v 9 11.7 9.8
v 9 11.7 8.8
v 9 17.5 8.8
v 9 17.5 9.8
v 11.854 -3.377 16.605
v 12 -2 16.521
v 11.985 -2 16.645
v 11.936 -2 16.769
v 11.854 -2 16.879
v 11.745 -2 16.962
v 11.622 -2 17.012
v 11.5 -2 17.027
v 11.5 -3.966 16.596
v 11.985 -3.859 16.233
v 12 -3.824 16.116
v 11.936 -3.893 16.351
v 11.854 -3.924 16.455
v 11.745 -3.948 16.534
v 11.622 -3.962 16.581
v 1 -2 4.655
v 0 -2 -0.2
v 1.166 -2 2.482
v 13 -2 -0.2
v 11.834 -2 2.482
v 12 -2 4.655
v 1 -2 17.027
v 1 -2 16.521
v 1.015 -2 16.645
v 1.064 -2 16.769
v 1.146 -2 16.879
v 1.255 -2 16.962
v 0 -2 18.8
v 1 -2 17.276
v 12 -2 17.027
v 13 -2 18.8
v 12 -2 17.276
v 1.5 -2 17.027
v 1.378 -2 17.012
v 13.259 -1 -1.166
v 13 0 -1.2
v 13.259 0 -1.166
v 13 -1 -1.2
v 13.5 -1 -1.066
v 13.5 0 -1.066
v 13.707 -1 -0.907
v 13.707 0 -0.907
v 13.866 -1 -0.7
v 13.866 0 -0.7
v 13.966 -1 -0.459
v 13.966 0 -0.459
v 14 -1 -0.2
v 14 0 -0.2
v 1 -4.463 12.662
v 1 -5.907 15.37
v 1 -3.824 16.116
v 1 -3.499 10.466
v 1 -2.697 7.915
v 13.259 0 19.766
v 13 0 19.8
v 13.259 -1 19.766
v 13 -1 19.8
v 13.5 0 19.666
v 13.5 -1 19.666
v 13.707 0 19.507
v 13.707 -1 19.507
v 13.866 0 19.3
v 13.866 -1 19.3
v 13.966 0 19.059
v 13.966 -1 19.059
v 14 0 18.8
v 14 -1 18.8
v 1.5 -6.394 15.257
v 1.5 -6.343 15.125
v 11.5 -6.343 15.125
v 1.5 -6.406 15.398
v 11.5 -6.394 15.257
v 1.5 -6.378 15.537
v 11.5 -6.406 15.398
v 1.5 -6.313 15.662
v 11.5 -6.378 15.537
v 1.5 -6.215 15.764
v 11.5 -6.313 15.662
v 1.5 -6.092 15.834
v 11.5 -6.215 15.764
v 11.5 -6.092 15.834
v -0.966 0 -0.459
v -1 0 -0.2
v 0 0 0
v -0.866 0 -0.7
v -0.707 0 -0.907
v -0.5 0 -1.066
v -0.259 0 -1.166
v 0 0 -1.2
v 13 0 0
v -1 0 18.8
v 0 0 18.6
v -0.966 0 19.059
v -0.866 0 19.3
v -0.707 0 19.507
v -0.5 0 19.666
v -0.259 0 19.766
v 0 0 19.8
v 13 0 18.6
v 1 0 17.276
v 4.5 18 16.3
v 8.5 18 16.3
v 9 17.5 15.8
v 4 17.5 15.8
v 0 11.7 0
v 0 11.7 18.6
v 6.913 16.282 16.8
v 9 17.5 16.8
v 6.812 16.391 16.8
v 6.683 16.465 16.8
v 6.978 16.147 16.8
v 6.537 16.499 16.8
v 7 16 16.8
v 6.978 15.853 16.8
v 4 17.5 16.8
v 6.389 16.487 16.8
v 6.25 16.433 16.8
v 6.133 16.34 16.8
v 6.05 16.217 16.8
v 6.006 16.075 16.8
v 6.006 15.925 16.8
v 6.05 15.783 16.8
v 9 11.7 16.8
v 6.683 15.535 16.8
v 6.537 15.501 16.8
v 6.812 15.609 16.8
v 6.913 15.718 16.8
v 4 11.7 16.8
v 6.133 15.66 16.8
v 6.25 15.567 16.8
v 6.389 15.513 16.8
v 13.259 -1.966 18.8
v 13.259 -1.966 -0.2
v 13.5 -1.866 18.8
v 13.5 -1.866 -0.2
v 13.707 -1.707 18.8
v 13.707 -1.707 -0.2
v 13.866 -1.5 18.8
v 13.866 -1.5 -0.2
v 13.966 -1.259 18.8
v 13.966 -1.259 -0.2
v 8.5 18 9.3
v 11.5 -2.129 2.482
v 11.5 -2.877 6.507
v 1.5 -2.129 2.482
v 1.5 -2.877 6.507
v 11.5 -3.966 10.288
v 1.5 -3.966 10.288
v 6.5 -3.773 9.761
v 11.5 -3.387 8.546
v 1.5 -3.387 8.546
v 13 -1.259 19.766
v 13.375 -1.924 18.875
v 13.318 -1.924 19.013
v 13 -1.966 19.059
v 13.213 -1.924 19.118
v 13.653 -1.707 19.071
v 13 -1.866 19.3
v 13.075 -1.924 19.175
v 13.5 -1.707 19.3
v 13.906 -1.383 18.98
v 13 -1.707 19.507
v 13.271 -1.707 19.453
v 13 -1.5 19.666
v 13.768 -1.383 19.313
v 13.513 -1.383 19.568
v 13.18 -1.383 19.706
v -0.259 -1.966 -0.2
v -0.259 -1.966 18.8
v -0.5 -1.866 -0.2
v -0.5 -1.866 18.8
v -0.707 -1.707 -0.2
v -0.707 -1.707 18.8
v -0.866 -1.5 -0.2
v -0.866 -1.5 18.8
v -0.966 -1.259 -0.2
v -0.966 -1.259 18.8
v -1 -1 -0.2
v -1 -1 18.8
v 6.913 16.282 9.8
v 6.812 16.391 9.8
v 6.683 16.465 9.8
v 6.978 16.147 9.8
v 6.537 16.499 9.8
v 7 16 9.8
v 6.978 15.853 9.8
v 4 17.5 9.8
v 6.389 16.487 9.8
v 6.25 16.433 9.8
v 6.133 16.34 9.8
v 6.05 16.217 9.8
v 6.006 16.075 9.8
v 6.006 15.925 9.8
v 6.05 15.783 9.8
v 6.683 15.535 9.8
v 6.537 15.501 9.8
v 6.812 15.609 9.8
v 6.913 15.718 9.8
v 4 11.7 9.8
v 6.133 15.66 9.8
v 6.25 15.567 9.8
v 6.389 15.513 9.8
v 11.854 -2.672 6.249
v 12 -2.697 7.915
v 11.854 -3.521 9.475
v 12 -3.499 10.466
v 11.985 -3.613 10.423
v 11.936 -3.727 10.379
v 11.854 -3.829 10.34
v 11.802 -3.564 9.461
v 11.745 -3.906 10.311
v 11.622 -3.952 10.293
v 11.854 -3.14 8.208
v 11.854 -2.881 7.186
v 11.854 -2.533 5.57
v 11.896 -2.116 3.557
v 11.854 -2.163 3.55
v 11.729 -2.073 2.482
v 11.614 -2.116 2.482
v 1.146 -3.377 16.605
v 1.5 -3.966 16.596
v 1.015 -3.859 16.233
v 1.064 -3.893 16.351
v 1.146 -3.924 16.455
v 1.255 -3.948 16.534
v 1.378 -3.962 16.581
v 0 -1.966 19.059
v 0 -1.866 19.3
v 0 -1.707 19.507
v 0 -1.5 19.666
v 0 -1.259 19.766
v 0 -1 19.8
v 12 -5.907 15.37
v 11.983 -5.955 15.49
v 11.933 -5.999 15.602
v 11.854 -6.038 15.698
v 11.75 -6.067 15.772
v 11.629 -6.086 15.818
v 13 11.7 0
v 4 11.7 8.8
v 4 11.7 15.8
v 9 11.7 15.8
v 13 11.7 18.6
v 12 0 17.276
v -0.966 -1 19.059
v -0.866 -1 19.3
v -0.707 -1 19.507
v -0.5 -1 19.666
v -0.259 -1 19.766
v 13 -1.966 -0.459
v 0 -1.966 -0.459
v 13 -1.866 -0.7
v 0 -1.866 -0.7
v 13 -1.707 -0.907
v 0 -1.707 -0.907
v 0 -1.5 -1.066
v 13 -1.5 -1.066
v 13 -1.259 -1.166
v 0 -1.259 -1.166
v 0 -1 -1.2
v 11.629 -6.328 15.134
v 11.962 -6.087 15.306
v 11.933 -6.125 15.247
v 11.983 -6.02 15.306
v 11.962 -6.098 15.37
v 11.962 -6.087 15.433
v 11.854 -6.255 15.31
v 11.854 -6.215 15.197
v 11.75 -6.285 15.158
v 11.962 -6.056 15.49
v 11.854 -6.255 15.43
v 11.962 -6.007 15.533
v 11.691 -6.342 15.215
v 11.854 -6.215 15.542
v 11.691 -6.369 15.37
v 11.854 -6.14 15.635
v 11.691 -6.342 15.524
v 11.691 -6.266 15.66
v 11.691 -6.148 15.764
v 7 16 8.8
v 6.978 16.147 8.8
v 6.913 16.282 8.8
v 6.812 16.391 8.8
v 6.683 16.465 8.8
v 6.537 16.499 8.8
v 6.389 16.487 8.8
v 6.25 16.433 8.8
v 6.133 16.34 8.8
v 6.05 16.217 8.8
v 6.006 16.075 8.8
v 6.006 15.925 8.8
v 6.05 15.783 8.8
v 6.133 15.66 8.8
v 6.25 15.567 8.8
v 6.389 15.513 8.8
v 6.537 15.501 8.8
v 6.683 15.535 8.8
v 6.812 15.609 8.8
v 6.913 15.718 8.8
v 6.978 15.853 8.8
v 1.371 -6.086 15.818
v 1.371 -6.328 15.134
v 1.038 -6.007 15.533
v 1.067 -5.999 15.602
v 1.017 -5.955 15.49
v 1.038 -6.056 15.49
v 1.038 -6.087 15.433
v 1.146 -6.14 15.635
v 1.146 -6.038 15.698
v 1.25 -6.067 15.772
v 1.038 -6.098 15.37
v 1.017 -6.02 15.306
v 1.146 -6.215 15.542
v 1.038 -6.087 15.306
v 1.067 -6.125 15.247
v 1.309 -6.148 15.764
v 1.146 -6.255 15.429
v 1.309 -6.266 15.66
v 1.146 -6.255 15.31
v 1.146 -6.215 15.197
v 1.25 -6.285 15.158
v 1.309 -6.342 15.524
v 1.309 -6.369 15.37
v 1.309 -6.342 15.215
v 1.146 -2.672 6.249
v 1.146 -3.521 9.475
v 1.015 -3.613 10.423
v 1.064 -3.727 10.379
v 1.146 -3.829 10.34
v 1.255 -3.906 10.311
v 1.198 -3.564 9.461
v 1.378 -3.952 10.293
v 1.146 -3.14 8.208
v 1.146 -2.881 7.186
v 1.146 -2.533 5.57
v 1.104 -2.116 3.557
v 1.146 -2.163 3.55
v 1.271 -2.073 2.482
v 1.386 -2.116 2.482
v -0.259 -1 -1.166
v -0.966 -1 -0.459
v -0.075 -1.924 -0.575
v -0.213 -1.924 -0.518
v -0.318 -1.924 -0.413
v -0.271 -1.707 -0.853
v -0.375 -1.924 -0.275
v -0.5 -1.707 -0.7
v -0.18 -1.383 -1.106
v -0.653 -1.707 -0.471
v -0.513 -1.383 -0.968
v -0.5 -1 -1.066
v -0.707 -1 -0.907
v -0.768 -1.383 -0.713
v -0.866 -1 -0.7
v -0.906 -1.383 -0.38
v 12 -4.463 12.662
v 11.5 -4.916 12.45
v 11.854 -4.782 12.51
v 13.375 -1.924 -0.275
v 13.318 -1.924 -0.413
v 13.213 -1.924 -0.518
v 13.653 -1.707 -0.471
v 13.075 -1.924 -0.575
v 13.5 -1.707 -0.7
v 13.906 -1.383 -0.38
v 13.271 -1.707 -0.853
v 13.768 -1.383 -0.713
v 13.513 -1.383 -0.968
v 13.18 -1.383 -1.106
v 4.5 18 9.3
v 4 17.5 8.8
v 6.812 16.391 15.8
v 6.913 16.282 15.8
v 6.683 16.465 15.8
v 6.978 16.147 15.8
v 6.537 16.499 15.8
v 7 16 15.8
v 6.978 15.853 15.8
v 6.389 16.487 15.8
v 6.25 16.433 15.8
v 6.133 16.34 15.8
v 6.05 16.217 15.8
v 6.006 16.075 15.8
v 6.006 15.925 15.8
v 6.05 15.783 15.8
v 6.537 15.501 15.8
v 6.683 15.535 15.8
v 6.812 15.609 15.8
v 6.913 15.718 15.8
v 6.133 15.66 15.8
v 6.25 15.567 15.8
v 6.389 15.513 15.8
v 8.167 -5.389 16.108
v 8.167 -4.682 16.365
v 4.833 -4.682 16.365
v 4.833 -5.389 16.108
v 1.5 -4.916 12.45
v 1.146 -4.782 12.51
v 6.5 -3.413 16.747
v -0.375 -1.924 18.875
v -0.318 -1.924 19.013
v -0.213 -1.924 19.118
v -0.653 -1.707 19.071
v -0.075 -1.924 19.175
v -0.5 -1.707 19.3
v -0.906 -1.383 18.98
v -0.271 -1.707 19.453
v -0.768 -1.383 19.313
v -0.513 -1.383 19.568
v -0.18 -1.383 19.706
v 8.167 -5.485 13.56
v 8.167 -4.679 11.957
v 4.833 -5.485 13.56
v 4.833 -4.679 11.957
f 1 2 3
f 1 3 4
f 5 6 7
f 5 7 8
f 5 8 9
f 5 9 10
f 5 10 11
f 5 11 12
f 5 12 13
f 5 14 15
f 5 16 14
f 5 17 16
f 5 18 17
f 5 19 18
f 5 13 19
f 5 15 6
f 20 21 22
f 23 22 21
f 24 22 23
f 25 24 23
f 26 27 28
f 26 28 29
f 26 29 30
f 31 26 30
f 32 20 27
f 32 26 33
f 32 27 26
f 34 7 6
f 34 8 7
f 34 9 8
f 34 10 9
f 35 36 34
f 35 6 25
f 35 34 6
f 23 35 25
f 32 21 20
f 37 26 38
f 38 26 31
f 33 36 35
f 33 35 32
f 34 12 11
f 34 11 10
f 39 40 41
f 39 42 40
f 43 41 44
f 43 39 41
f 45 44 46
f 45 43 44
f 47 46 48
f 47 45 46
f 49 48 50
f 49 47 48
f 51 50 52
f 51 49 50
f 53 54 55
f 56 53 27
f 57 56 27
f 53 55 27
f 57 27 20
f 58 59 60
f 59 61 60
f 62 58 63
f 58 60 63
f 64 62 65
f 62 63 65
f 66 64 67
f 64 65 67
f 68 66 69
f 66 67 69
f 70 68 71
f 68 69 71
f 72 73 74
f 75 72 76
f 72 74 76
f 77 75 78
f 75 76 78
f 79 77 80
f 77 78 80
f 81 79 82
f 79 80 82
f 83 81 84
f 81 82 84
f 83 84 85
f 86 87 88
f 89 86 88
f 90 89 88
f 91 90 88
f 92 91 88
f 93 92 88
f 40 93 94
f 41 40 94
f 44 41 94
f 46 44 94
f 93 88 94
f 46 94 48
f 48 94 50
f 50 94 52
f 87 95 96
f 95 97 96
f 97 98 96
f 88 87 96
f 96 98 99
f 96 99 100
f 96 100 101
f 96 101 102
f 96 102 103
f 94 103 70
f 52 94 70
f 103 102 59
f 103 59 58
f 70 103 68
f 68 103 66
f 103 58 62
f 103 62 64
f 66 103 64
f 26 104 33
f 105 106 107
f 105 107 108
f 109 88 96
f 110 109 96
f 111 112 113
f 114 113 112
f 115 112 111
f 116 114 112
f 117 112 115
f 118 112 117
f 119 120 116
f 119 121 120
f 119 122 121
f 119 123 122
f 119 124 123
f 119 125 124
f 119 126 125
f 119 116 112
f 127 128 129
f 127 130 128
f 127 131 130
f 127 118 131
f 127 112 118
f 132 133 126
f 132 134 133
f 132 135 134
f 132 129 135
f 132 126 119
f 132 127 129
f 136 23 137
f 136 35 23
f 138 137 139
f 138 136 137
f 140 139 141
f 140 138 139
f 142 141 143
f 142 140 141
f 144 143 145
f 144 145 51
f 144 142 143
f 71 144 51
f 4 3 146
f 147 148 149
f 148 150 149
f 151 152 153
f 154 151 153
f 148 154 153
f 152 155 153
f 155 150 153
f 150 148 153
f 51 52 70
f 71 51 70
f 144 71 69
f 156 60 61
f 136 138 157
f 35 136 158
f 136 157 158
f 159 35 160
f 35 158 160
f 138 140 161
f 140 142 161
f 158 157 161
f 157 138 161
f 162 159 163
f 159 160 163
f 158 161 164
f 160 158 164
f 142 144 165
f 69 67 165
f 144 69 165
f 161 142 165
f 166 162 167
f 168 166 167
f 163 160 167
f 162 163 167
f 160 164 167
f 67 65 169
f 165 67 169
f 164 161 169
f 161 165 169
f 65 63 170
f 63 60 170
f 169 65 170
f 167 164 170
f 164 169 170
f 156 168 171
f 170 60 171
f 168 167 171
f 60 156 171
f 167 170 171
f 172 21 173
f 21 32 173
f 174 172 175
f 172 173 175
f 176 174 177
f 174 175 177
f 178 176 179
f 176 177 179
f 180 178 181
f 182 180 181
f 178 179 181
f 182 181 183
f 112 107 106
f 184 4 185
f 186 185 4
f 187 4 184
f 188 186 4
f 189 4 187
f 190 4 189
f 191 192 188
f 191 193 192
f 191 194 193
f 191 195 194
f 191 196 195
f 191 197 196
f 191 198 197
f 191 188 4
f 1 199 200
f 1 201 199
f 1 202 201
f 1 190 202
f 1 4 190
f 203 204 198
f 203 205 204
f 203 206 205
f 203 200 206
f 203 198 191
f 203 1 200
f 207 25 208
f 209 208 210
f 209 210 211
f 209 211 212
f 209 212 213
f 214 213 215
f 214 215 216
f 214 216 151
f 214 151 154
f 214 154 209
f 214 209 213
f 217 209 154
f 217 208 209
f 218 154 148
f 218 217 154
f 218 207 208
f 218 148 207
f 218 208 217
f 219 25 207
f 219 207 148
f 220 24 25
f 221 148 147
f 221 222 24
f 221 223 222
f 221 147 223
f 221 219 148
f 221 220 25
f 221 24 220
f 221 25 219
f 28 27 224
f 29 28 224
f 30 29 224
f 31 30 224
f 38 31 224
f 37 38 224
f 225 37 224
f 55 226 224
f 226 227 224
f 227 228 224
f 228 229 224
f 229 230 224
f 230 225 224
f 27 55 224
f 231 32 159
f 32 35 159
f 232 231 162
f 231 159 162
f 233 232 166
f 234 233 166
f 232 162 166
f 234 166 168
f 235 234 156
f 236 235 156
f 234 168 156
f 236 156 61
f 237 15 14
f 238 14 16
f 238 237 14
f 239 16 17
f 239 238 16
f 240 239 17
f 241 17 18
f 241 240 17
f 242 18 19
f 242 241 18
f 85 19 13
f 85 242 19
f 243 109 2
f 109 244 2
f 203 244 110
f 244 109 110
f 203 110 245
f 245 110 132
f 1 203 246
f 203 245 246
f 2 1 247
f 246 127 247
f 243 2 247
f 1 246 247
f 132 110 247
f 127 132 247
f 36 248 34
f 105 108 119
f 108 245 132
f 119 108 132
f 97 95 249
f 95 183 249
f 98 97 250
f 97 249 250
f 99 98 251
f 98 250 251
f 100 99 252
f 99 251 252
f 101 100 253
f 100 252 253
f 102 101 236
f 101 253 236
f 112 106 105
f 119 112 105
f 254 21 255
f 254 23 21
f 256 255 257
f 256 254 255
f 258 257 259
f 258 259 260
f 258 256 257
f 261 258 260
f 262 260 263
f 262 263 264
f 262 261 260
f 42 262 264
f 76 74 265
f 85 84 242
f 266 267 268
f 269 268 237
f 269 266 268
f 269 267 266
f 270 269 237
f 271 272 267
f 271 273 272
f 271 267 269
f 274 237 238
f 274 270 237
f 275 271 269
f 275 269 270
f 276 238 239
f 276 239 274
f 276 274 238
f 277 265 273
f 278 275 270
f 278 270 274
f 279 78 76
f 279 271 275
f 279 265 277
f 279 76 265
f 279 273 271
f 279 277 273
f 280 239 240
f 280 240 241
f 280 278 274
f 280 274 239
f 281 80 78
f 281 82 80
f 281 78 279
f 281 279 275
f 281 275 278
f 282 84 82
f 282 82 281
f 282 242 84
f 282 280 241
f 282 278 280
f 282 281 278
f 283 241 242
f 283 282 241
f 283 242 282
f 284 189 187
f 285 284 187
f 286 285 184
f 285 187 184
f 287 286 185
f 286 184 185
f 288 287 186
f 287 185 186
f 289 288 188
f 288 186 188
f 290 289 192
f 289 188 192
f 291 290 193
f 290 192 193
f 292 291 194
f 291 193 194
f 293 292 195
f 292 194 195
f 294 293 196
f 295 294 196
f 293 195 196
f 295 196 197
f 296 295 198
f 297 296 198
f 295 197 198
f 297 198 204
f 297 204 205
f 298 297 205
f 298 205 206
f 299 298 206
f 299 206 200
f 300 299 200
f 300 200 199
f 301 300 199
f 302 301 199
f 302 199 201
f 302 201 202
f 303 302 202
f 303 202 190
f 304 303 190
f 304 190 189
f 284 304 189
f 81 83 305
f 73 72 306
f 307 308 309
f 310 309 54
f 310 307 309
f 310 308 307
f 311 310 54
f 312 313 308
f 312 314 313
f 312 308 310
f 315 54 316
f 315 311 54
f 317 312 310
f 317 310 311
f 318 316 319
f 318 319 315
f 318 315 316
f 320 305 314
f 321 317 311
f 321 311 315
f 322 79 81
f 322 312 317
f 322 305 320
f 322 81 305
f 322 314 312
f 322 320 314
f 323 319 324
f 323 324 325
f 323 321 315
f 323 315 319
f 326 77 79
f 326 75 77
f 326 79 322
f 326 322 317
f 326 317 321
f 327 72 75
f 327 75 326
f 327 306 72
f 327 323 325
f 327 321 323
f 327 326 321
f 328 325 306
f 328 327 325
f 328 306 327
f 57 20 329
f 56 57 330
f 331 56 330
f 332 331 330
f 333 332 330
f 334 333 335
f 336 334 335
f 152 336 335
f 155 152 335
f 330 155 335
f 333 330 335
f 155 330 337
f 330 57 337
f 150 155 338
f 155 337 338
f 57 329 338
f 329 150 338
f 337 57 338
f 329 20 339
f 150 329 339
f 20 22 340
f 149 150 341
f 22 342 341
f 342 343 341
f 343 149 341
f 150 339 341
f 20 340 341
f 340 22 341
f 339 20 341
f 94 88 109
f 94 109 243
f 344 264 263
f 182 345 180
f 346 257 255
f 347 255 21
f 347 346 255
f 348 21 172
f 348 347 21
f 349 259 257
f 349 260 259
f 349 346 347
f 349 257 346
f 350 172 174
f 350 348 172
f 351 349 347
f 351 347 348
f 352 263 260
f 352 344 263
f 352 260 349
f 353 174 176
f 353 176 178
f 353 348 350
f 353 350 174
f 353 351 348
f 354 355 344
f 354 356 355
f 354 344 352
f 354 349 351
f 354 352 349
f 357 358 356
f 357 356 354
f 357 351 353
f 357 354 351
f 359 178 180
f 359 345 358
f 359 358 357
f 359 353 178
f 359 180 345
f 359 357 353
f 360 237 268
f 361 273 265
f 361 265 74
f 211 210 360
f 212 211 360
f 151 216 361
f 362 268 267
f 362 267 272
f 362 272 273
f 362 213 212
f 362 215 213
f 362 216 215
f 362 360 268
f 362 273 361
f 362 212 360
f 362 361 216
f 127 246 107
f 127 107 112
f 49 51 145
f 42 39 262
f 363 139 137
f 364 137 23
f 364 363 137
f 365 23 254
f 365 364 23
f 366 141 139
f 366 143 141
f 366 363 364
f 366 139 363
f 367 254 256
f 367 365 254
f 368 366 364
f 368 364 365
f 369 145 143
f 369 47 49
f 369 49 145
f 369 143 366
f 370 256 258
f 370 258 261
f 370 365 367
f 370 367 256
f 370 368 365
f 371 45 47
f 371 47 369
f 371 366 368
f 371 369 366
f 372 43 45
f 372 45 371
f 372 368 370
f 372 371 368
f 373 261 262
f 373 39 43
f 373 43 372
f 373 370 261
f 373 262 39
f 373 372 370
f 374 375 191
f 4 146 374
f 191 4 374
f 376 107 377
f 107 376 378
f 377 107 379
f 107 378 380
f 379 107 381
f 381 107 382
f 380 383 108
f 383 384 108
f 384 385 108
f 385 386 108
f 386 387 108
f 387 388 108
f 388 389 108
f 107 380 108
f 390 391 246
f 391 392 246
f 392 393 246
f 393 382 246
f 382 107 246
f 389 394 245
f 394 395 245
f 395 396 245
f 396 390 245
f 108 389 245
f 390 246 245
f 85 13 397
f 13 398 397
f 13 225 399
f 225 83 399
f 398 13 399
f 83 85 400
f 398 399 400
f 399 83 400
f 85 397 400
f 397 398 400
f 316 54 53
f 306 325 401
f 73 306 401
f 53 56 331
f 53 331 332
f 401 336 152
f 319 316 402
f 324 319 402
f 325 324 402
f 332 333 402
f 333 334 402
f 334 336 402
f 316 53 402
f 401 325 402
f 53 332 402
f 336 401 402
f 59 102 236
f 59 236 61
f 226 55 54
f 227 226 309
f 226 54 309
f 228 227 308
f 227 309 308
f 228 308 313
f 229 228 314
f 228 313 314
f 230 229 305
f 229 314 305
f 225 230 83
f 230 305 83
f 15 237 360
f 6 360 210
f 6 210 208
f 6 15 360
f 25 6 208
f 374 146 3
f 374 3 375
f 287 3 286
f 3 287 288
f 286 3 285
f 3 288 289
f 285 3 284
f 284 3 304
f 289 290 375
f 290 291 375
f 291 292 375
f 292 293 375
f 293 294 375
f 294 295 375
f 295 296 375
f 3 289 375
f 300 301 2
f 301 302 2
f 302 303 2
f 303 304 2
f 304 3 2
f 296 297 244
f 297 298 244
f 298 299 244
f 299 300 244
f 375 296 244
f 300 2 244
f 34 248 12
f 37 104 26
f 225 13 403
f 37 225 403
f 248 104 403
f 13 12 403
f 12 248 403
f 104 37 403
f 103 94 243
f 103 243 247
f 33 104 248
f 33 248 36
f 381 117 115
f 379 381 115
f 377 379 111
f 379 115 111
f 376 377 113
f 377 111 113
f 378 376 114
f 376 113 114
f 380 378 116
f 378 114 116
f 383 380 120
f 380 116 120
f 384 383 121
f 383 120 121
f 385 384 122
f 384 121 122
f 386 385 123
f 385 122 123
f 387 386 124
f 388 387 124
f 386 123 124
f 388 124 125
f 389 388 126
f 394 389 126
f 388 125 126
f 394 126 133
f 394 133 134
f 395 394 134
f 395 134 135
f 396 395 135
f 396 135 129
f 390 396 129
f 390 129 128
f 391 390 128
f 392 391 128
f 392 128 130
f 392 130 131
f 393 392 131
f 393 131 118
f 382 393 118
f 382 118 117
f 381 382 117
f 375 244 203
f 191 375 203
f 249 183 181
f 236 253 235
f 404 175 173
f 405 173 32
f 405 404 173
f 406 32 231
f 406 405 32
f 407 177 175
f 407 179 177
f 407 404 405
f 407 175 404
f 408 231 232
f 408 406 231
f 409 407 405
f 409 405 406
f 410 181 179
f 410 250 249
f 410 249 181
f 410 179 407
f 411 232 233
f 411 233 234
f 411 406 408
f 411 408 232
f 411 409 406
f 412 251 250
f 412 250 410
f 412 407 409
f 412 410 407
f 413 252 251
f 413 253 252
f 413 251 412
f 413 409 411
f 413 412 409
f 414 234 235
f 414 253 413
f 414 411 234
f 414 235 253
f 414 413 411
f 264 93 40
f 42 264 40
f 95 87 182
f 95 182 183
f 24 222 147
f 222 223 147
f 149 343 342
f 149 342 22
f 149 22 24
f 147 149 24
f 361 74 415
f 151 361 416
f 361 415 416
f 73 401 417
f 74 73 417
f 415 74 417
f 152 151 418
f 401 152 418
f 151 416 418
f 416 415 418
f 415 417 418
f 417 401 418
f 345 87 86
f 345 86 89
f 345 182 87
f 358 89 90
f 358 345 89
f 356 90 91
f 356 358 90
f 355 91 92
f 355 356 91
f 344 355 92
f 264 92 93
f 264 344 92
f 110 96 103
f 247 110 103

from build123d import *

# Parameters (mm, degrees)
F0_W      = 13
F0_H      = 18.6
F1_DEPTH  = 11.7
F2_W      = 15
F2_H      = 21
F3_DEPTH  = 2
F5_START  = 1
F5_DEPTH  = 11
F6_START  = 1
F6_DEPTH  = 11
F7_R      = 1
F8_R      = 0.5
F9_W      = 5
F9_H      = 1
F10_DEPTH = 6.3
F11_SIZE  = 0.49999
F12_R     = 0.5
F13_DEPTH = 25


# Not quite as in the source:
# - a fillet or chamfer is up to 0.001 mm smaller than in the source, because OpenCascade refuses the exact size


with BuildPart() as f1:
    # F0 (on Front) → F1 (new body)
    with BuildSketch(Plane.XZ):
        with Locations((6.5, 9.3)):
            Rectangle(F0_W, F0_H)
    extrude(amount=-F1_DEPTH)

    # F2 (on Front) → F3 (join)
    with BuildSketch(Plane.XZ):
        with Locations((6.5, 9.3)):
            Rectangle(F2_W, F2_H)
    extrude(amount=F3_DEPTH)

    # F4 (on Right) → F5 (cut)
    with BuildSketch(Plane.YZ.offset(F5_START)):
        with BuildLine():
            add(Edge.make_bspline(
                [(0, 17.2755792737), (-1.1526457271, 17.1501791024), (-2.4983857291, 17.0037715611), (-3.7827872231, 16.6499606711), (-3.9660306647, 16.5956447667)],
                knots=[0, 0, 0, 0, 0.5019383156, 0.586024356, 0.586024356, 0.586024356, 0.586024356], degree=3))
            Line((0, 17.2755792737), (-3.9660306647, 17.2755792737))
            Line((-3.9660306647, 17.2755792737), (-3.9660306647, 16.5956447667))
        make_face()
        with BuildLine():
            Line((-3.9660306647, 2.481617732), (-2.1293810569, 2.481617732))
            add(Edge.make_bspline(
                [(-3.9660306647, 10.2878685019), (-3.8996200875, 10.1138282619), (-3.0167436481, 7.7059620865), (-2.5562801998, 4.9949850403), (-2.1293810569, 2.481617732)],
                knots=[0.4423976039, 0.4423976039, 0.4423976039, 0.4423976039, 0.4830426044, 1, 1, 1, 1], degree=3))
            Line((-3.9660306647, 10.2878685019), (-3.9660306647, 2.481617732))
        make_face()
        with BuildLine():
            add(Edge.make_bspline(
                [(-3.9660306647, 10.2878685019), (-3.8996200875, 10.1138282619), (-3.0167436481, 7.7059620865), (-2.5562801998, 4.9949850403), (-2.1293810569, 2.481617732)],
                knots=[0.4423976039, 0.4423976039, 0.4423976039, 0.4423976039, 0.4830426044, 1, 1, 1, 1], degree=3))
            Line((-2.1293810569, 2.481617732), (0, 2.481617732))
            Line((0, 2.481617732), (0, 17.2755792737))
            add(Edge.make_bspline(
                [(0, 17.2755792737), (-1.1526457271, 17.1501791024), (-2.4983857291, 17.0037715611), (-3.7827872231, 16.6499606711), (-3.9660306647, 16.5956447667)],
                knots=[0, 0, 0, 0, 0.5019383156, 0.586024356, 0.586024356, 0.586024356, 0.586024356], degree=3))
            Line((-3.9660306647, 16.5956447667), (-3.9660306647, 10.2878685019))
        make_face()
    extrude(amount=F5_DEPTH, mode=Mode.SUBTRACT)

    # F4 (on Right) → F6 (join)
    with BuildSketch(Plane.YZ.offset(F6_START)):
        with BuildLine():
            add(Edge.make_bspline(
                [(-3.9660306647, 10.2878685019), (-3.8996200875, 10.1138282619), (-3.0167436481, 7.7059620865), (-2.5562801998, 4.9949850403), (-2.1293810569, 2.481617732)],
                knots=[0.4423976039, 0.4423976039, 0.4423976039, 0.4423976039, 0.4830426044, 1, 1, 1, 1], degree=3))
            Line((-2.1293810569, 2.481617732), (0, 2.481617732))
            Line((0, 2.481617732), (0, 17.2755792737))
            add(Edge.make_bspline(
                [(0, 17.2755792737), (-1.1526457271, 17.1501791024), (-2.4983857291, 17.0037715611), (-3.7827872231, 16.6499606711), (-3.9660306647, 16.5956447667)],
                knots=[0, 0, 0, 0, 0.5019383156, 0.586024356, 0.586024356, 0.586024356, 0.586024356], degree=3))
            Line((-3.9660306647, 16.5956447667), (-3.9660306647, 10.2878685019))
        make_face()
        with BuildLine():
            add(Edge.make_bspline(
                [(-6.621601202, 15.6213638948), (-5.6552365252, 13.9017804778), (-4.6888718484, 12.1821970608), (-3.9660306647, 10.2878685019)],
                knots=[0, 0, 0, 0, 0.4423976039, 0.4423976039, 0.4423976039, 0.4423976039], degree=3))
            Line((-3.9660306647, 10.2878685019), (-3.9660306647, 16.5956447667))
            add(Edge.make_bspline(
                [(-3.9660306647, 16.5956447667), (-4.8681818595, 16.3282346066), (-5.7448915308, 15.9747992507), (-6.621601202, 15.6213638948)],
                knots=[0.586024356, 0.586024356, 0.586024356, 0.586024356, 1, 1, 1, 1], degree=3))
        make_face()
    extrude(amount=F6_DEPTH)

    # F7
    f7_edges = [f1.edges().sort_by_distance(p)[0] for p in [
        (14, -1, -1.2),
        (-1, -1, -1.2),
        (-1, -1, 19.8),
        (14, -1, 19.8),
        (14, -2, 9.3),
        (6.5, -2, -1.2),
        (-1, -2, 9.3),
        (6.5, -2, 19.8),
    ]]
    fillet(f7_edges, radius=F7_R)

    # F8
    f8_edges = [f1.edges().sort_by_distance(p)[0] for p in [
        (1, -4.35533, 16.47468),
        (1, -3.6216, 9.312473),
        (6.5, -6.621601, 15.621364),
        (12, -3.6216, 9.312473),
        (12, -4.35533, 16.47468),
    ]]
    fillet(f8_edges, radius=F8_R)

    # F9 (on face) → F10 (join)
    with BuildSketch(Plane(origin=(0, 11.7, 0), x_dir=(-1, 0, 0), z_dir=(0, 1, 0))):
        with Locations((-6.5, 9.3)):
            Rectangle(F9_W, F9_H)
        with Locations((-6.5, 16.3)):
            Rectangle(F9_W, F9_H)
    extrude(amount=F10_DEPTH)

    # F11 (size 0.5 in the source; OpenCascade refuses exactly that, so slightly less here)
    f11_edges = [f1.edges().sort_by_distance(p)[0] for p in [
        (4, 18, 16.3),
        (9, 18, 16.3),
        (4, 18, 9.3),
        (9, 18, 9.3),
        (6.5, 18, 16.8),
        (6.5, 18, 15.8),
        (6.5, 18, 9.8),
        (6.5, 18, 8.8),
    ]]
    chamfer(f11_edges, length=F11_SIZE)

    # F12 (on face) → F13 (cut)
    with BuildSketch(Plane.XY.offset(16.8)):
        with Locations((6.5, 16)):
            Circle(F12_R)
    extrude(amount=-F13_DEPTH, mode=Mode.SUBTRACT)


solid = f1.part
